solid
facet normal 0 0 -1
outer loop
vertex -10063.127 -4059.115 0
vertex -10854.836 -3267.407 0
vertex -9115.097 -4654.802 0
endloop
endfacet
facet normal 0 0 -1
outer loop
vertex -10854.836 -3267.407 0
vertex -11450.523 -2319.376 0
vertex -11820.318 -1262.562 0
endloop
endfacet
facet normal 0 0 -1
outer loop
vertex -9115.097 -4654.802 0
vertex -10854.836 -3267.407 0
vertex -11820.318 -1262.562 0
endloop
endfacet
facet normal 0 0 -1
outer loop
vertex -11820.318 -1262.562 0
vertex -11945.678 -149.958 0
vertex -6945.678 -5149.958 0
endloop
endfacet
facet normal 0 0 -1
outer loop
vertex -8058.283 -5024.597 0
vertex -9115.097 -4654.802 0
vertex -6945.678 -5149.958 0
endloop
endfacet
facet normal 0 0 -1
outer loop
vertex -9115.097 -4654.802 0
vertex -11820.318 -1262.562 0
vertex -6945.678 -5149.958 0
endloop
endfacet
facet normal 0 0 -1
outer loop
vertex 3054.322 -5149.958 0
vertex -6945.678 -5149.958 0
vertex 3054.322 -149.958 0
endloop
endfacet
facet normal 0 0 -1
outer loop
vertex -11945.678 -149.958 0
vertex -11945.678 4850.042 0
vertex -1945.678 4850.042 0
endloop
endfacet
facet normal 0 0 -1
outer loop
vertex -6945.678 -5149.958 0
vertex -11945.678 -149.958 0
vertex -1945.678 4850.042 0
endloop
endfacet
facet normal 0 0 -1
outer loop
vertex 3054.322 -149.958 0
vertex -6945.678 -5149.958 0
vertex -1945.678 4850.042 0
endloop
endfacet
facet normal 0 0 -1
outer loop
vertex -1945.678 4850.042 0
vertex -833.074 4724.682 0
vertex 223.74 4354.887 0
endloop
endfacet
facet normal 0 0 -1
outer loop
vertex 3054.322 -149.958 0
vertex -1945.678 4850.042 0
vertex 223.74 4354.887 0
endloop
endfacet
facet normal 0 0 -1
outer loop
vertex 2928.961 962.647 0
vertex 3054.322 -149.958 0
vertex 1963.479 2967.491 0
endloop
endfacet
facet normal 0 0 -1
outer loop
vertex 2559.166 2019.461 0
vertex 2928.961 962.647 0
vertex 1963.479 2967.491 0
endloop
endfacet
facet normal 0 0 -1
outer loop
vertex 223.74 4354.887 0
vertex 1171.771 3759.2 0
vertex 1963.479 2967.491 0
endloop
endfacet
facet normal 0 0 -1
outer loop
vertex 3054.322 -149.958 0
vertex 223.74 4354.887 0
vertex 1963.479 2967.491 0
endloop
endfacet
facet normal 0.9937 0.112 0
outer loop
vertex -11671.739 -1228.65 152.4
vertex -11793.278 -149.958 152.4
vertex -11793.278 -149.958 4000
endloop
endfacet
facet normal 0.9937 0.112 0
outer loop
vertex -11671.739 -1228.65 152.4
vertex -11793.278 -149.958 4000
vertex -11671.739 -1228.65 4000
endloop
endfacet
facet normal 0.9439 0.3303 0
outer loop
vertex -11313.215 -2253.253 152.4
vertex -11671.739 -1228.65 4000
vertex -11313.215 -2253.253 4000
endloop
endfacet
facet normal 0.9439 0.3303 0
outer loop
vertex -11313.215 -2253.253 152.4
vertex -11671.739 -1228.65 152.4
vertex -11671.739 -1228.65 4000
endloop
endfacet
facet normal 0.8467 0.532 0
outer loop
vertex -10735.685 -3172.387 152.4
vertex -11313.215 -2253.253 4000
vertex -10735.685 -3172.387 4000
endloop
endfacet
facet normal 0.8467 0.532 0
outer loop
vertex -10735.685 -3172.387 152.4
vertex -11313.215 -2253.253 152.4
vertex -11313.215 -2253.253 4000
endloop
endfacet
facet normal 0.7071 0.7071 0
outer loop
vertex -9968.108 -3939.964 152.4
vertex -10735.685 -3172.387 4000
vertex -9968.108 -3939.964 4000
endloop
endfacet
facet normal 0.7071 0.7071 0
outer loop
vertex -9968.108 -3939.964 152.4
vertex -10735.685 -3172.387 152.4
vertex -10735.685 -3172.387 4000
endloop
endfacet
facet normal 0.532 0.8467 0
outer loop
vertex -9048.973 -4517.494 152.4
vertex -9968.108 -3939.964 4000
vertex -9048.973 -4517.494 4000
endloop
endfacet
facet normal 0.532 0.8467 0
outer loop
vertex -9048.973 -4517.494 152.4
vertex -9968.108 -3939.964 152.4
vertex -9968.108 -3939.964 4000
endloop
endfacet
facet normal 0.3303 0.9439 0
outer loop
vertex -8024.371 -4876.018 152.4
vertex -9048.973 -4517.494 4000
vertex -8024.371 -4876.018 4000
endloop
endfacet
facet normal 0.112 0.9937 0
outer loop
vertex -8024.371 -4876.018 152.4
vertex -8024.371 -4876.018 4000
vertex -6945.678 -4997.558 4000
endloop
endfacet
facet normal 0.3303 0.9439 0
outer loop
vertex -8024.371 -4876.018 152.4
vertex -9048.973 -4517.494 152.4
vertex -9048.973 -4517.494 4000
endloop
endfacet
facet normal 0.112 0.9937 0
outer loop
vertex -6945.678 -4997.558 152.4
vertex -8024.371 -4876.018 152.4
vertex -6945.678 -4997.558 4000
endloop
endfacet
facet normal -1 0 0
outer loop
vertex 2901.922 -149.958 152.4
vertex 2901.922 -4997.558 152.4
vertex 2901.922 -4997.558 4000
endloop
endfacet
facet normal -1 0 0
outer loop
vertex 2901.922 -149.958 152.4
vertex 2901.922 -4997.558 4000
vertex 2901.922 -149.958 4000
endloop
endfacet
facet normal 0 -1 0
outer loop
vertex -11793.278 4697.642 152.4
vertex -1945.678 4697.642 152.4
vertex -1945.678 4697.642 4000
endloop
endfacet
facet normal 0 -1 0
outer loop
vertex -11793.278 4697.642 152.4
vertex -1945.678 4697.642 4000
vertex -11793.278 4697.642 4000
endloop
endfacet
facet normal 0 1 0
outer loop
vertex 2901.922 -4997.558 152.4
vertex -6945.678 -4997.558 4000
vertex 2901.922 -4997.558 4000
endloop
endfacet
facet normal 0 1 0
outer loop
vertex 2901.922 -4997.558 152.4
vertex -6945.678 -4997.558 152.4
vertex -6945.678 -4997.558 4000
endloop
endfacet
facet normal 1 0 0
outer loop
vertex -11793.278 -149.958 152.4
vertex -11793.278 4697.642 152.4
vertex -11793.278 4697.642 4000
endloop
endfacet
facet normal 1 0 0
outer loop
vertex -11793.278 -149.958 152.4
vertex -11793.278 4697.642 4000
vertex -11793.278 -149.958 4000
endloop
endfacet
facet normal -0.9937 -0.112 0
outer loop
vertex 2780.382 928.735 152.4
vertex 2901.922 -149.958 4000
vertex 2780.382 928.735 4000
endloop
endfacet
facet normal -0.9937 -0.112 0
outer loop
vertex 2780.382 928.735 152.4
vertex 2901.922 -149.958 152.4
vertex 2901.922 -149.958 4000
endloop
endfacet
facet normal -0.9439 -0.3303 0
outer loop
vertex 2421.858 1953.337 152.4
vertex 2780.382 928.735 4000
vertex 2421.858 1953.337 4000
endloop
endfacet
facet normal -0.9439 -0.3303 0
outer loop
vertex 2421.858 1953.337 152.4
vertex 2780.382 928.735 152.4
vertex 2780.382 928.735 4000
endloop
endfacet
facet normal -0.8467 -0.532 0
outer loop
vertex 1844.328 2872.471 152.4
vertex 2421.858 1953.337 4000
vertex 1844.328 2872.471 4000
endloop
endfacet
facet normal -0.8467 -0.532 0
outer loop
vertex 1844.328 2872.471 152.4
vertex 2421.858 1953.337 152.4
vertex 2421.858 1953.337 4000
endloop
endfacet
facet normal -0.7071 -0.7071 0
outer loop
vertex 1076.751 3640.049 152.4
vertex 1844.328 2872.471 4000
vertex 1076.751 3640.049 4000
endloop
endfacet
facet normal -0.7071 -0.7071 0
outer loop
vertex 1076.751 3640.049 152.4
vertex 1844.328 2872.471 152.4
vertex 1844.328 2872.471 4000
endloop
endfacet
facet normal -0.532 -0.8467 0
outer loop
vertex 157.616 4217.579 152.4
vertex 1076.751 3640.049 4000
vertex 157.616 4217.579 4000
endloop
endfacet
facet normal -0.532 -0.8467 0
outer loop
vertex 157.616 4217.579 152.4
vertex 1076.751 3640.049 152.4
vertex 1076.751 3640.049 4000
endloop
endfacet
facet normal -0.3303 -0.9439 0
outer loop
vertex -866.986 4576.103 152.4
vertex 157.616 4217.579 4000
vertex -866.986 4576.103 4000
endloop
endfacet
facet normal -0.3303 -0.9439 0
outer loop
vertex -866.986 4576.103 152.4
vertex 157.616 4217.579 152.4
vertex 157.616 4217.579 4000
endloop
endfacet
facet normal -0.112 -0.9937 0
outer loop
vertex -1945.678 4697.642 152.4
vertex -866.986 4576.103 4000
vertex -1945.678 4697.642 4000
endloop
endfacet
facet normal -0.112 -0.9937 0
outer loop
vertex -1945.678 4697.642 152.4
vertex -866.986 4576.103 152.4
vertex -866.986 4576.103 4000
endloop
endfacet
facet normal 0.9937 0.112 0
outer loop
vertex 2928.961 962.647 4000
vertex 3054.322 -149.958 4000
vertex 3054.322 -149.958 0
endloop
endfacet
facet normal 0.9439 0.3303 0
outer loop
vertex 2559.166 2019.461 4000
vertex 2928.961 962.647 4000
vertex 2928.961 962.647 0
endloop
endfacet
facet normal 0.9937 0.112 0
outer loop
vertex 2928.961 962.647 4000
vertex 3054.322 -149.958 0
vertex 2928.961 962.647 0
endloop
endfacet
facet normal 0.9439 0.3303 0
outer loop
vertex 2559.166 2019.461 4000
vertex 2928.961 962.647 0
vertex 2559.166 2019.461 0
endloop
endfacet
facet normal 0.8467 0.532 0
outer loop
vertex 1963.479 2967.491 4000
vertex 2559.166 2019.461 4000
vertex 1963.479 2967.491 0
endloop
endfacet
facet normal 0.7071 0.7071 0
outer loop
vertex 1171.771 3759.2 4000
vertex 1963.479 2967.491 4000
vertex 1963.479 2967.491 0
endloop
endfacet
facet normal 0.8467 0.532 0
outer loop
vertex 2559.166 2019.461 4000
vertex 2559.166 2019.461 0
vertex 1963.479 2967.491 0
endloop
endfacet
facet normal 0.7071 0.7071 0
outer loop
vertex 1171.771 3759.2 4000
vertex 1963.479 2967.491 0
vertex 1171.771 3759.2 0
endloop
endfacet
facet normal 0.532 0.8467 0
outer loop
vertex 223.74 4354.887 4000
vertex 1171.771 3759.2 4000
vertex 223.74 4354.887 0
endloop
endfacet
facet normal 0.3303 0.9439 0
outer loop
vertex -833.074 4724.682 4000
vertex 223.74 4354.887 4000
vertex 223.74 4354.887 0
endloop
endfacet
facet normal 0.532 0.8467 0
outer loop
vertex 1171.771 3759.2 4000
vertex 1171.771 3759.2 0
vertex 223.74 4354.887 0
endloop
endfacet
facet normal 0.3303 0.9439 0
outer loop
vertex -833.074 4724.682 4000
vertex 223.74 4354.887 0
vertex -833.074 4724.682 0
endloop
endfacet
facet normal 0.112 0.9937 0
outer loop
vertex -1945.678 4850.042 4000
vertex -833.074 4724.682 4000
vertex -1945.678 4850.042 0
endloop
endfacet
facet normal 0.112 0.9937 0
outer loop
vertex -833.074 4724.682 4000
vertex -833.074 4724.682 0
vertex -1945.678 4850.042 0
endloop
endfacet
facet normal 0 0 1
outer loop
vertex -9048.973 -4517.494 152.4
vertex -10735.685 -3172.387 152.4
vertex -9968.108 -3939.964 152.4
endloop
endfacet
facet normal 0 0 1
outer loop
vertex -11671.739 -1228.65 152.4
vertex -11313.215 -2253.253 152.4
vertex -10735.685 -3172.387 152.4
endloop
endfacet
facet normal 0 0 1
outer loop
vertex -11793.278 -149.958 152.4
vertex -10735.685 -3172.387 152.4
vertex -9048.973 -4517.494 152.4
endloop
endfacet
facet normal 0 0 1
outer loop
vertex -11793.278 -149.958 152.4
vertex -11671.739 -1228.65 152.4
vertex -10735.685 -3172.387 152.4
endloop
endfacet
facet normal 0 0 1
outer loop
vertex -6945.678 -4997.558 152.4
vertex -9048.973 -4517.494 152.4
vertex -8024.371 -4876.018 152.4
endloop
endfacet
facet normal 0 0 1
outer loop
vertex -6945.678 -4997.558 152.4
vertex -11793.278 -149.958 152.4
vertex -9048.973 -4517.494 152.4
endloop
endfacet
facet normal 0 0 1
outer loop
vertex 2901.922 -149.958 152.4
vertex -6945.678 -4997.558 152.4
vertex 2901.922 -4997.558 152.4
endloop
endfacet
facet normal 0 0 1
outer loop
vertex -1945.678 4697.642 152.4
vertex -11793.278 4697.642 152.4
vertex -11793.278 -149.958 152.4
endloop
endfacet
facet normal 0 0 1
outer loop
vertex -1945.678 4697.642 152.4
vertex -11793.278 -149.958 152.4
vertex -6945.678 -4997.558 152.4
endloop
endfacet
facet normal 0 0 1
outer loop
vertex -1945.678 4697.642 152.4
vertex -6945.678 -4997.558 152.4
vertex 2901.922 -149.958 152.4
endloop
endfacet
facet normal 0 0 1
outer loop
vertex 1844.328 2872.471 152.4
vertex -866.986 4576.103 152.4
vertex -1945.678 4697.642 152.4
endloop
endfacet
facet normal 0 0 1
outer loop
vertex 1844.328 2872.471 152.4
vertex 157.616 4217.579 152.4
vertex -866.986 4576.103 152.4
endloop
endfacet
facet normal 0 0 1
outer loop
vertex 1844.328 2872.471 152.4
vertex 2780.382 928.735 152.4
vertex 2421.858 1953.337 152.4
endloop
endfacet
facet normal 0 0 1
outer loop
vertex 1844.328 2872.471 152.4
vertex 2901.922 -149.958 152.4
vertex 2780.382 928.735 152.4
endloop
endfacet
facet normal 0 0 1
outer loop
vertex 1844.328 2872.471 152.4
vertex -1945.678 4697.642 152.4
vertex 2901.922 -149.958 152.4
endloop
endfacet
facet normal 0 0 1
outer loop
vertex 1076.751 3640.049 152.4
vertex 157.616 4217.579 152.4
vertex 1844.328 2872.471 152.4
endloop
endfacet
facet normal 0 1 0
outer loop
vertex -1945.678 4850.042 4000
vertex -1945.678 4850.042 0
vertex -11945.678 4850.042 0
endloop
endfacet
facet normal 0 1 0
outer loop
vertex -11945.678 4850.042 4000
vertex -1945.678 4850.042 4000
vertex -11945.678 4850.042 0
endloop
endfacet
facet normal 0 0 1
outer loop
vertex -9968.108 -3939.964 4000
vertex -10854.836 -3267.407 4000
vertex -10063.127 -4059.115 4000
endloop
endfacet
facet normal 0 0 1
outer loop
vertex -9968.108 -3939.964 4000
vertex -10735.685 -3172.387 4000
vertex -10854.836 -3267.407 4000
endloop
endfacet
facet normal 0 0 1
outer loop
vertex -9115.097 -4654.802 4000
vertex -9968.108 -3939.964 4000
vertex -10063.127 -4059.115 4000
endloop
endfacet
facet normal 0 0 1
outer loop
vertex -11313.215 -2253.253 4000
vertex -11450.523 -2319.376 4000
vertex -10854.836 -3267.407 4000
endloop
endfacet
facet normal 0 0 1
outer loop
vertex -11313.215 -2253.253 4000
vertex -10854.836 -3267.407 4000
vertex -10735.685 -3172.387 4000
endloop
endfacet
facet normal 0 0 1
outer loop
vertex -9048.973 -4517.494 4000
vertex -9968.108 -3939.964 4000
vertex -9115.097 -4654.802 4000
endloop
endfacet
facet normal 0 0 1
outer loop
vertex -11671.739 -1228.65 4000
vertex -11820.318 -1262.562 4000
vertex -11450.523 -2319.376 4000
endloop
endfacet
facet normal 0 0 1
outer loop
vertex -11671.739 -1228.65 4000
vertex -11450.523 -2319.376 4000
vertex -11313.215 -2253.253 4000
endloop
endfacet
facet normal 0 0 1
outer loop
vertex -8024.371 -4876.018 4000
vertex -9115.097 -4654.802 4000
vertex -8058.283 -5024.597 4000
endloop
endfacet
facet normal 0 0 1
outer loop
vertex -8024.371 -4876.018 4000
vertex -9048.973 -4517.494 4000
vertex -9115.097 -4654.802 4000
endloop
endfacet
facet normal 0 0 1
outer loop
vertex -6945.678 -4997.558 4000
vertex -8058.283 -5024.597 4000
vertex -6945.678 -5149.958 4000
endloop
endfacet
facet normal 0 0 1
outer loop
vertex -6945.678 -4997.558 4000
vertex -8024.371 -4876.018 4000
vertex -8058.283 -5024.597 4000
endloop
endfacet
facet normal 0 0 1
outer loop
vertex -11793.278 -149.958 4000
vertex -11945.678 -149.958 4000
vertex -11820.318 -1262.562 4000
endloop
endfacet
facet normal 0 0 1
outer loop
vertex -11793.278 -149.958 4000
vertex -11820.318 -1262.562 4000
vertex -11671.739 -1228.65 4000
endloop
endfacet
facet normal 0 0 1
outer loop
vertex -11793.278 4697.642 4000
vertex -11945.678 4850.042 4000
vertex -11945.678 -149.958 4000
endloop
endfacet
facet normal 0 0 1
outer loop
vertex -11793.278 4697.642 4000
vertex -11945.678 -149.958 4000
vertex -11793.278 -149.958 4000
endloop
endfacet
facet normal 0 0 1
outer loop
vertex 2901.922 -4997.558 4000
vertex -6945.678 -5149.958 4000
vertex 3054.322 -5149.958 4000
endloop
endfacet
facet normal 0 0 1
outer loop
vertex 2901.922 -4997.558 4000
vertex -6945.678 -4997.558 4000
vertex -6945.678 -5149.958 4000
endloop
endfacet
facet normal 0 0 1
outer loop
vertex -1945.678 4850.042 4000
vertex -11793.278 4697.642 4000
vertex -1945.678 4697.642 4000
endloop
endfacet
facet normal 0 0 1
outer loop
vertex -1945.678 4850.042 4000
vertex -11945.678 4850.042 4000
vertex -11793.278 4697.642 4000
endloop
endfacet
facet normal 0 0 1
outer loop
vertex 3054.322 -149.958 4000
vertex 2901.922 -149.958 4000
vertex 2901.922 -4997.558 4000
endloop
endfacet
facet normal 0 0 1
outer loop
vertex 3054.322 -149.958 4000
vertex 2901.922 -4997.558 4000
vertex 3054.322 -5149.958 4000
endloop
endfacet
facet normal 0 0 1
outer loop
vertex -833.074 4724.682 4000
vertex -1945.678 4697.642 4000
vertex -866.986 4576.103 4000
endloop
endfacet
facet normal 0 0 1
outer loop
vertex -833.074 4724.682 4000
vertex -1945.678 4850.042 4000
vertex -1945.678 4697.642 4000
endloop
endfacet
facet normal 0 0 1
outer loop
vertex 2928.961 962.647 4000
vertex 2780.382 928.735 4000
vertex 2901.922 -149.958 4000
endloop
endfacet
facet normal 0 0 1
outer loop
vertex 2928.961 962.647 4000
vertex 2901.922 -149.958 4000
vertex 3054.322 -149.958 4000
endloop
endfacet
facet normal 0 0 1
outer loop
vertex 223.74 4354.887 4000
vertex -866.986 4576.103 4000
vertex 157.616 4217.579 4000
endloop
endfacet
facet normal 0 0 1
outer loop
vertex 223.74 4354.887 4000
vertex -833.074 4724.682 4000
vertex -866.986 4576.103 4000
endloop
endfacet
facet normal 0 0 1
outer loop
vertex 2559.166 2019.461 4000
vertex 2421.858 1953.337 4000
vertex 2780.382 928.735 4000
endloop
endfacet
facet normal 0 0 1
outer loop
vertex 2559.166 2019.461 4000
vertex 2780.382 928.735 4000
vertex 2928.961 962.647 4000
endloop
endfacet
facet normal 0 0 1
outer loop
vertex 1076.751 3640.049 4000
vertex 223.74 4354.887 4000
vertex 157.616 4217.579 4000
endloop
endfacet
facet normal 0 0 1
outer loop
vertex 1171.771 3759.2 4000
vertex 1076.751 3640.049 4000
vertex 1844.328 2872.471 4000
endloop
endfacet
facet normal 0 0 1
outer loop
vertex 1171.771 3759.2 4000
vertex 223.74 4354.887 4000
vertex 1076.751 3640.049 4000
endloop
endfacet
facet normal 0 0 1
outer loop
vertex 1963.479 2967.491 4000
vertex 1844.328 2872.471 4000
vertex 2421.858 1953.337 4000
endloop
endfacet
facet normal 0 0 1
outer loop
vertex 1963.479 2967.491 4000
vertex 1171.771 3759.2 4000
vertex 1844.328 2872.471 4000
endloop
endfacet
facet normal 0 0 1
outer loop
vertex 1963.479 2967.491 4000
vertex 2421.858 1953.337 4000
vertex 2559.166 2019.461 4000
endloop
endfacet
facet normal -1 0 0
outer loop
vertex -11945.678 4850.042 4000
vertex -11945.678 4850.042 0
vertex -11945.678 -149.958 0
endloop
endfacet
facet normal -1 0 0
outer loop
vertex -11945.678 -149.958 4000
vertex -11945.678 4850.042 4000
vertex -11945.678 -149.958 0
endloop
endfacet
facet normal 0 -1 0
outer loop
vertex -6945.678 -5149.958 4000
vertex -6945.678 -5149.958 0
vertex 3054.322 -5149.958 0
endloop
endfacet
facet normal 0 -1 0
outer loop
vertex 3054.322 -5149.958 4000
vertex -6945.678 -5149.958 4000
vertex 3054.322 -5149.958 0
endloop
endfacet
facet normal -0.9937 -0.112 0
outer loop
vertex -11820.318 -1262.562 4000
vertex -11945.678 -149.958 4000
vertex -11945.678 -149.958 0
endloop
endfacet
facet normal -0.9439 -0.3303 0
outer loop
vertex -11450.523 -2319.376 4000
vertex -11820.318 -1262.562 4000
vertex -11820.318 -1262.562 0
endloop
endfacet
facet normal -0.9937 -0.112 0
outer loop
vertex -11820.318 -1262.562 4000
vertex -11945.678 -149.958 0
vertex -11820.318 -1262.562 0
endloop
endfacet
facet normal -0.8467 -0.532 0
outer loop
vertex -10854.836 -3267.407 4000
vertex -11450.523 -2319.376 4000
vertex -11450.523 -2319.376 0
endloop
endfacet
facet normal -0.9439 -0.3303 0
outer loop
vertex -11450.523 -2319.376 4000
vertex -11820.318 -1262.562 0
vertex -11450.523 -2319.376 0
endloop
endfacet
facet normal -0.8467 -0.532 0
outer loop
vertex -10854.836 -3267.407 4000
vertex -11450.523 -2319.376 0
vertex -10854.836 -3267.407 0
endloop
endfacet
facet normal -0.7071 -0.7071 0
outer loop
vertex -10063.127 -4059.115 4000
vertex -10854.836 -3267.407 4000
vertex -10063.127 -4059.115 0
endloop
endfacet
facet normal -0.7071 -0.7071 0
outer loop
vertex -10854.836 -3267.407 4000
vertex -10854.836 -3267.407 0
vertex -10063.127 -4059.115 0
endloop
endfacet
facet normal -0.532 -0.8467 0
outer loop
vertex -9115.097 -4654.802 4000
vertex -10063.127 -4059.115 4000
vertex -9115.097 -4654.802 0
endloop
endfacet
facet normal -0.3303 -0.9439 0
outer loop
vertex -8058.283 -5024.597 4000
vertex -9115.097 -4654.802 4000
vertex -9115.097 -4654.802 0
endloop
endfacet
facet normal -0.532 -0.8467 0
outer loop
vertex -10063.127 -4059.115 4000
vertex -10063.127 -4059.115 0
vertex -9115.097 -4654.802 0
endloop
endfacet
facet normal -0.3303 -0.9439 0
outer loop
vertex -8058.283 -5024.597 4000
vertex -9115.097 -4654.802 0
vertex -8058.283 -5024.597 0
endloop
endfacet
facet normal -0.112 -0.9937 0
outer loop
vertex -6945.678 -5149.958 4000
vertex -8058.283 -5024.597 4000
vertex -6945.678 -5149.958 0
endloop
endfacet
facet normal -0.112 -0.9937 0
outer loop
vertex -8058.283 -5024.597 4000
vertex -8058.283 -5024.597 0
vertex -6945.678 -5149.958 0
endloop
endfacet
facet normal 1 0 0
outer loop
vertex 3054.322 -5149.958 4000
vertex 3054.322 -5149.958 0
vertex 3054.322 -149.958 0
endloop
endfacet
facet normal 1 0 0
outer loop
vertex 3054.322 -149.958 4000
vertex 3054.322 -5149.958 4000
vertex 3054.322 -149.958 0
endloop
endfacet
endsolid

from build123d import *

# Parameters (mm, degrees)
F1_DEPTH = 4000
F2_T     = -152.4


# Not quite as in the source:
# - the program builds the solid bodies; features that only make, move or delete a surface that nothing else refers to are left out


with BuildPart() as f1:
    # F0 (on Top) → F1 (new body)
    with BuildSketch(Plane.XY):
        with BuildLine():
            Line((-1945.6784874201, 4850.0422537327), (-11945.6784874201, 4850.0422537327))
            Line((-11945.6784874201, 4850.0422537327), (-11945.6784874201, -149.9577462673))
            ThreePointArc((-11945.6784874201, -149.9577462673), (-10481.2123933528, -3685.4916522001), (-6945.6784874201, -5149.9577462673))
            Line((-6945.6784874201, -5149.9577462673), (3054.3215125799, -5149.9577462673))
            Line((3054.3215125799, -5149.9577462673), (3054.3215125799, -149.9577462673))
            ThreePointArc((3054.3215125799, -149.9577462673), (1589.8554185127, 3385.5761596654), (-1945.6784874201, 4850.0422537327))
        make_face()
    extrude(amount=F1_DEPTH)

    # F2
    f2_openings = [f1.faces().sort_by_distance(p)[0] for p in [
        (-4445.678487, -149.957746, 4000),
    ]]
    offset(amount=F2_T, openings=f2_openings)


solid = f1.part
